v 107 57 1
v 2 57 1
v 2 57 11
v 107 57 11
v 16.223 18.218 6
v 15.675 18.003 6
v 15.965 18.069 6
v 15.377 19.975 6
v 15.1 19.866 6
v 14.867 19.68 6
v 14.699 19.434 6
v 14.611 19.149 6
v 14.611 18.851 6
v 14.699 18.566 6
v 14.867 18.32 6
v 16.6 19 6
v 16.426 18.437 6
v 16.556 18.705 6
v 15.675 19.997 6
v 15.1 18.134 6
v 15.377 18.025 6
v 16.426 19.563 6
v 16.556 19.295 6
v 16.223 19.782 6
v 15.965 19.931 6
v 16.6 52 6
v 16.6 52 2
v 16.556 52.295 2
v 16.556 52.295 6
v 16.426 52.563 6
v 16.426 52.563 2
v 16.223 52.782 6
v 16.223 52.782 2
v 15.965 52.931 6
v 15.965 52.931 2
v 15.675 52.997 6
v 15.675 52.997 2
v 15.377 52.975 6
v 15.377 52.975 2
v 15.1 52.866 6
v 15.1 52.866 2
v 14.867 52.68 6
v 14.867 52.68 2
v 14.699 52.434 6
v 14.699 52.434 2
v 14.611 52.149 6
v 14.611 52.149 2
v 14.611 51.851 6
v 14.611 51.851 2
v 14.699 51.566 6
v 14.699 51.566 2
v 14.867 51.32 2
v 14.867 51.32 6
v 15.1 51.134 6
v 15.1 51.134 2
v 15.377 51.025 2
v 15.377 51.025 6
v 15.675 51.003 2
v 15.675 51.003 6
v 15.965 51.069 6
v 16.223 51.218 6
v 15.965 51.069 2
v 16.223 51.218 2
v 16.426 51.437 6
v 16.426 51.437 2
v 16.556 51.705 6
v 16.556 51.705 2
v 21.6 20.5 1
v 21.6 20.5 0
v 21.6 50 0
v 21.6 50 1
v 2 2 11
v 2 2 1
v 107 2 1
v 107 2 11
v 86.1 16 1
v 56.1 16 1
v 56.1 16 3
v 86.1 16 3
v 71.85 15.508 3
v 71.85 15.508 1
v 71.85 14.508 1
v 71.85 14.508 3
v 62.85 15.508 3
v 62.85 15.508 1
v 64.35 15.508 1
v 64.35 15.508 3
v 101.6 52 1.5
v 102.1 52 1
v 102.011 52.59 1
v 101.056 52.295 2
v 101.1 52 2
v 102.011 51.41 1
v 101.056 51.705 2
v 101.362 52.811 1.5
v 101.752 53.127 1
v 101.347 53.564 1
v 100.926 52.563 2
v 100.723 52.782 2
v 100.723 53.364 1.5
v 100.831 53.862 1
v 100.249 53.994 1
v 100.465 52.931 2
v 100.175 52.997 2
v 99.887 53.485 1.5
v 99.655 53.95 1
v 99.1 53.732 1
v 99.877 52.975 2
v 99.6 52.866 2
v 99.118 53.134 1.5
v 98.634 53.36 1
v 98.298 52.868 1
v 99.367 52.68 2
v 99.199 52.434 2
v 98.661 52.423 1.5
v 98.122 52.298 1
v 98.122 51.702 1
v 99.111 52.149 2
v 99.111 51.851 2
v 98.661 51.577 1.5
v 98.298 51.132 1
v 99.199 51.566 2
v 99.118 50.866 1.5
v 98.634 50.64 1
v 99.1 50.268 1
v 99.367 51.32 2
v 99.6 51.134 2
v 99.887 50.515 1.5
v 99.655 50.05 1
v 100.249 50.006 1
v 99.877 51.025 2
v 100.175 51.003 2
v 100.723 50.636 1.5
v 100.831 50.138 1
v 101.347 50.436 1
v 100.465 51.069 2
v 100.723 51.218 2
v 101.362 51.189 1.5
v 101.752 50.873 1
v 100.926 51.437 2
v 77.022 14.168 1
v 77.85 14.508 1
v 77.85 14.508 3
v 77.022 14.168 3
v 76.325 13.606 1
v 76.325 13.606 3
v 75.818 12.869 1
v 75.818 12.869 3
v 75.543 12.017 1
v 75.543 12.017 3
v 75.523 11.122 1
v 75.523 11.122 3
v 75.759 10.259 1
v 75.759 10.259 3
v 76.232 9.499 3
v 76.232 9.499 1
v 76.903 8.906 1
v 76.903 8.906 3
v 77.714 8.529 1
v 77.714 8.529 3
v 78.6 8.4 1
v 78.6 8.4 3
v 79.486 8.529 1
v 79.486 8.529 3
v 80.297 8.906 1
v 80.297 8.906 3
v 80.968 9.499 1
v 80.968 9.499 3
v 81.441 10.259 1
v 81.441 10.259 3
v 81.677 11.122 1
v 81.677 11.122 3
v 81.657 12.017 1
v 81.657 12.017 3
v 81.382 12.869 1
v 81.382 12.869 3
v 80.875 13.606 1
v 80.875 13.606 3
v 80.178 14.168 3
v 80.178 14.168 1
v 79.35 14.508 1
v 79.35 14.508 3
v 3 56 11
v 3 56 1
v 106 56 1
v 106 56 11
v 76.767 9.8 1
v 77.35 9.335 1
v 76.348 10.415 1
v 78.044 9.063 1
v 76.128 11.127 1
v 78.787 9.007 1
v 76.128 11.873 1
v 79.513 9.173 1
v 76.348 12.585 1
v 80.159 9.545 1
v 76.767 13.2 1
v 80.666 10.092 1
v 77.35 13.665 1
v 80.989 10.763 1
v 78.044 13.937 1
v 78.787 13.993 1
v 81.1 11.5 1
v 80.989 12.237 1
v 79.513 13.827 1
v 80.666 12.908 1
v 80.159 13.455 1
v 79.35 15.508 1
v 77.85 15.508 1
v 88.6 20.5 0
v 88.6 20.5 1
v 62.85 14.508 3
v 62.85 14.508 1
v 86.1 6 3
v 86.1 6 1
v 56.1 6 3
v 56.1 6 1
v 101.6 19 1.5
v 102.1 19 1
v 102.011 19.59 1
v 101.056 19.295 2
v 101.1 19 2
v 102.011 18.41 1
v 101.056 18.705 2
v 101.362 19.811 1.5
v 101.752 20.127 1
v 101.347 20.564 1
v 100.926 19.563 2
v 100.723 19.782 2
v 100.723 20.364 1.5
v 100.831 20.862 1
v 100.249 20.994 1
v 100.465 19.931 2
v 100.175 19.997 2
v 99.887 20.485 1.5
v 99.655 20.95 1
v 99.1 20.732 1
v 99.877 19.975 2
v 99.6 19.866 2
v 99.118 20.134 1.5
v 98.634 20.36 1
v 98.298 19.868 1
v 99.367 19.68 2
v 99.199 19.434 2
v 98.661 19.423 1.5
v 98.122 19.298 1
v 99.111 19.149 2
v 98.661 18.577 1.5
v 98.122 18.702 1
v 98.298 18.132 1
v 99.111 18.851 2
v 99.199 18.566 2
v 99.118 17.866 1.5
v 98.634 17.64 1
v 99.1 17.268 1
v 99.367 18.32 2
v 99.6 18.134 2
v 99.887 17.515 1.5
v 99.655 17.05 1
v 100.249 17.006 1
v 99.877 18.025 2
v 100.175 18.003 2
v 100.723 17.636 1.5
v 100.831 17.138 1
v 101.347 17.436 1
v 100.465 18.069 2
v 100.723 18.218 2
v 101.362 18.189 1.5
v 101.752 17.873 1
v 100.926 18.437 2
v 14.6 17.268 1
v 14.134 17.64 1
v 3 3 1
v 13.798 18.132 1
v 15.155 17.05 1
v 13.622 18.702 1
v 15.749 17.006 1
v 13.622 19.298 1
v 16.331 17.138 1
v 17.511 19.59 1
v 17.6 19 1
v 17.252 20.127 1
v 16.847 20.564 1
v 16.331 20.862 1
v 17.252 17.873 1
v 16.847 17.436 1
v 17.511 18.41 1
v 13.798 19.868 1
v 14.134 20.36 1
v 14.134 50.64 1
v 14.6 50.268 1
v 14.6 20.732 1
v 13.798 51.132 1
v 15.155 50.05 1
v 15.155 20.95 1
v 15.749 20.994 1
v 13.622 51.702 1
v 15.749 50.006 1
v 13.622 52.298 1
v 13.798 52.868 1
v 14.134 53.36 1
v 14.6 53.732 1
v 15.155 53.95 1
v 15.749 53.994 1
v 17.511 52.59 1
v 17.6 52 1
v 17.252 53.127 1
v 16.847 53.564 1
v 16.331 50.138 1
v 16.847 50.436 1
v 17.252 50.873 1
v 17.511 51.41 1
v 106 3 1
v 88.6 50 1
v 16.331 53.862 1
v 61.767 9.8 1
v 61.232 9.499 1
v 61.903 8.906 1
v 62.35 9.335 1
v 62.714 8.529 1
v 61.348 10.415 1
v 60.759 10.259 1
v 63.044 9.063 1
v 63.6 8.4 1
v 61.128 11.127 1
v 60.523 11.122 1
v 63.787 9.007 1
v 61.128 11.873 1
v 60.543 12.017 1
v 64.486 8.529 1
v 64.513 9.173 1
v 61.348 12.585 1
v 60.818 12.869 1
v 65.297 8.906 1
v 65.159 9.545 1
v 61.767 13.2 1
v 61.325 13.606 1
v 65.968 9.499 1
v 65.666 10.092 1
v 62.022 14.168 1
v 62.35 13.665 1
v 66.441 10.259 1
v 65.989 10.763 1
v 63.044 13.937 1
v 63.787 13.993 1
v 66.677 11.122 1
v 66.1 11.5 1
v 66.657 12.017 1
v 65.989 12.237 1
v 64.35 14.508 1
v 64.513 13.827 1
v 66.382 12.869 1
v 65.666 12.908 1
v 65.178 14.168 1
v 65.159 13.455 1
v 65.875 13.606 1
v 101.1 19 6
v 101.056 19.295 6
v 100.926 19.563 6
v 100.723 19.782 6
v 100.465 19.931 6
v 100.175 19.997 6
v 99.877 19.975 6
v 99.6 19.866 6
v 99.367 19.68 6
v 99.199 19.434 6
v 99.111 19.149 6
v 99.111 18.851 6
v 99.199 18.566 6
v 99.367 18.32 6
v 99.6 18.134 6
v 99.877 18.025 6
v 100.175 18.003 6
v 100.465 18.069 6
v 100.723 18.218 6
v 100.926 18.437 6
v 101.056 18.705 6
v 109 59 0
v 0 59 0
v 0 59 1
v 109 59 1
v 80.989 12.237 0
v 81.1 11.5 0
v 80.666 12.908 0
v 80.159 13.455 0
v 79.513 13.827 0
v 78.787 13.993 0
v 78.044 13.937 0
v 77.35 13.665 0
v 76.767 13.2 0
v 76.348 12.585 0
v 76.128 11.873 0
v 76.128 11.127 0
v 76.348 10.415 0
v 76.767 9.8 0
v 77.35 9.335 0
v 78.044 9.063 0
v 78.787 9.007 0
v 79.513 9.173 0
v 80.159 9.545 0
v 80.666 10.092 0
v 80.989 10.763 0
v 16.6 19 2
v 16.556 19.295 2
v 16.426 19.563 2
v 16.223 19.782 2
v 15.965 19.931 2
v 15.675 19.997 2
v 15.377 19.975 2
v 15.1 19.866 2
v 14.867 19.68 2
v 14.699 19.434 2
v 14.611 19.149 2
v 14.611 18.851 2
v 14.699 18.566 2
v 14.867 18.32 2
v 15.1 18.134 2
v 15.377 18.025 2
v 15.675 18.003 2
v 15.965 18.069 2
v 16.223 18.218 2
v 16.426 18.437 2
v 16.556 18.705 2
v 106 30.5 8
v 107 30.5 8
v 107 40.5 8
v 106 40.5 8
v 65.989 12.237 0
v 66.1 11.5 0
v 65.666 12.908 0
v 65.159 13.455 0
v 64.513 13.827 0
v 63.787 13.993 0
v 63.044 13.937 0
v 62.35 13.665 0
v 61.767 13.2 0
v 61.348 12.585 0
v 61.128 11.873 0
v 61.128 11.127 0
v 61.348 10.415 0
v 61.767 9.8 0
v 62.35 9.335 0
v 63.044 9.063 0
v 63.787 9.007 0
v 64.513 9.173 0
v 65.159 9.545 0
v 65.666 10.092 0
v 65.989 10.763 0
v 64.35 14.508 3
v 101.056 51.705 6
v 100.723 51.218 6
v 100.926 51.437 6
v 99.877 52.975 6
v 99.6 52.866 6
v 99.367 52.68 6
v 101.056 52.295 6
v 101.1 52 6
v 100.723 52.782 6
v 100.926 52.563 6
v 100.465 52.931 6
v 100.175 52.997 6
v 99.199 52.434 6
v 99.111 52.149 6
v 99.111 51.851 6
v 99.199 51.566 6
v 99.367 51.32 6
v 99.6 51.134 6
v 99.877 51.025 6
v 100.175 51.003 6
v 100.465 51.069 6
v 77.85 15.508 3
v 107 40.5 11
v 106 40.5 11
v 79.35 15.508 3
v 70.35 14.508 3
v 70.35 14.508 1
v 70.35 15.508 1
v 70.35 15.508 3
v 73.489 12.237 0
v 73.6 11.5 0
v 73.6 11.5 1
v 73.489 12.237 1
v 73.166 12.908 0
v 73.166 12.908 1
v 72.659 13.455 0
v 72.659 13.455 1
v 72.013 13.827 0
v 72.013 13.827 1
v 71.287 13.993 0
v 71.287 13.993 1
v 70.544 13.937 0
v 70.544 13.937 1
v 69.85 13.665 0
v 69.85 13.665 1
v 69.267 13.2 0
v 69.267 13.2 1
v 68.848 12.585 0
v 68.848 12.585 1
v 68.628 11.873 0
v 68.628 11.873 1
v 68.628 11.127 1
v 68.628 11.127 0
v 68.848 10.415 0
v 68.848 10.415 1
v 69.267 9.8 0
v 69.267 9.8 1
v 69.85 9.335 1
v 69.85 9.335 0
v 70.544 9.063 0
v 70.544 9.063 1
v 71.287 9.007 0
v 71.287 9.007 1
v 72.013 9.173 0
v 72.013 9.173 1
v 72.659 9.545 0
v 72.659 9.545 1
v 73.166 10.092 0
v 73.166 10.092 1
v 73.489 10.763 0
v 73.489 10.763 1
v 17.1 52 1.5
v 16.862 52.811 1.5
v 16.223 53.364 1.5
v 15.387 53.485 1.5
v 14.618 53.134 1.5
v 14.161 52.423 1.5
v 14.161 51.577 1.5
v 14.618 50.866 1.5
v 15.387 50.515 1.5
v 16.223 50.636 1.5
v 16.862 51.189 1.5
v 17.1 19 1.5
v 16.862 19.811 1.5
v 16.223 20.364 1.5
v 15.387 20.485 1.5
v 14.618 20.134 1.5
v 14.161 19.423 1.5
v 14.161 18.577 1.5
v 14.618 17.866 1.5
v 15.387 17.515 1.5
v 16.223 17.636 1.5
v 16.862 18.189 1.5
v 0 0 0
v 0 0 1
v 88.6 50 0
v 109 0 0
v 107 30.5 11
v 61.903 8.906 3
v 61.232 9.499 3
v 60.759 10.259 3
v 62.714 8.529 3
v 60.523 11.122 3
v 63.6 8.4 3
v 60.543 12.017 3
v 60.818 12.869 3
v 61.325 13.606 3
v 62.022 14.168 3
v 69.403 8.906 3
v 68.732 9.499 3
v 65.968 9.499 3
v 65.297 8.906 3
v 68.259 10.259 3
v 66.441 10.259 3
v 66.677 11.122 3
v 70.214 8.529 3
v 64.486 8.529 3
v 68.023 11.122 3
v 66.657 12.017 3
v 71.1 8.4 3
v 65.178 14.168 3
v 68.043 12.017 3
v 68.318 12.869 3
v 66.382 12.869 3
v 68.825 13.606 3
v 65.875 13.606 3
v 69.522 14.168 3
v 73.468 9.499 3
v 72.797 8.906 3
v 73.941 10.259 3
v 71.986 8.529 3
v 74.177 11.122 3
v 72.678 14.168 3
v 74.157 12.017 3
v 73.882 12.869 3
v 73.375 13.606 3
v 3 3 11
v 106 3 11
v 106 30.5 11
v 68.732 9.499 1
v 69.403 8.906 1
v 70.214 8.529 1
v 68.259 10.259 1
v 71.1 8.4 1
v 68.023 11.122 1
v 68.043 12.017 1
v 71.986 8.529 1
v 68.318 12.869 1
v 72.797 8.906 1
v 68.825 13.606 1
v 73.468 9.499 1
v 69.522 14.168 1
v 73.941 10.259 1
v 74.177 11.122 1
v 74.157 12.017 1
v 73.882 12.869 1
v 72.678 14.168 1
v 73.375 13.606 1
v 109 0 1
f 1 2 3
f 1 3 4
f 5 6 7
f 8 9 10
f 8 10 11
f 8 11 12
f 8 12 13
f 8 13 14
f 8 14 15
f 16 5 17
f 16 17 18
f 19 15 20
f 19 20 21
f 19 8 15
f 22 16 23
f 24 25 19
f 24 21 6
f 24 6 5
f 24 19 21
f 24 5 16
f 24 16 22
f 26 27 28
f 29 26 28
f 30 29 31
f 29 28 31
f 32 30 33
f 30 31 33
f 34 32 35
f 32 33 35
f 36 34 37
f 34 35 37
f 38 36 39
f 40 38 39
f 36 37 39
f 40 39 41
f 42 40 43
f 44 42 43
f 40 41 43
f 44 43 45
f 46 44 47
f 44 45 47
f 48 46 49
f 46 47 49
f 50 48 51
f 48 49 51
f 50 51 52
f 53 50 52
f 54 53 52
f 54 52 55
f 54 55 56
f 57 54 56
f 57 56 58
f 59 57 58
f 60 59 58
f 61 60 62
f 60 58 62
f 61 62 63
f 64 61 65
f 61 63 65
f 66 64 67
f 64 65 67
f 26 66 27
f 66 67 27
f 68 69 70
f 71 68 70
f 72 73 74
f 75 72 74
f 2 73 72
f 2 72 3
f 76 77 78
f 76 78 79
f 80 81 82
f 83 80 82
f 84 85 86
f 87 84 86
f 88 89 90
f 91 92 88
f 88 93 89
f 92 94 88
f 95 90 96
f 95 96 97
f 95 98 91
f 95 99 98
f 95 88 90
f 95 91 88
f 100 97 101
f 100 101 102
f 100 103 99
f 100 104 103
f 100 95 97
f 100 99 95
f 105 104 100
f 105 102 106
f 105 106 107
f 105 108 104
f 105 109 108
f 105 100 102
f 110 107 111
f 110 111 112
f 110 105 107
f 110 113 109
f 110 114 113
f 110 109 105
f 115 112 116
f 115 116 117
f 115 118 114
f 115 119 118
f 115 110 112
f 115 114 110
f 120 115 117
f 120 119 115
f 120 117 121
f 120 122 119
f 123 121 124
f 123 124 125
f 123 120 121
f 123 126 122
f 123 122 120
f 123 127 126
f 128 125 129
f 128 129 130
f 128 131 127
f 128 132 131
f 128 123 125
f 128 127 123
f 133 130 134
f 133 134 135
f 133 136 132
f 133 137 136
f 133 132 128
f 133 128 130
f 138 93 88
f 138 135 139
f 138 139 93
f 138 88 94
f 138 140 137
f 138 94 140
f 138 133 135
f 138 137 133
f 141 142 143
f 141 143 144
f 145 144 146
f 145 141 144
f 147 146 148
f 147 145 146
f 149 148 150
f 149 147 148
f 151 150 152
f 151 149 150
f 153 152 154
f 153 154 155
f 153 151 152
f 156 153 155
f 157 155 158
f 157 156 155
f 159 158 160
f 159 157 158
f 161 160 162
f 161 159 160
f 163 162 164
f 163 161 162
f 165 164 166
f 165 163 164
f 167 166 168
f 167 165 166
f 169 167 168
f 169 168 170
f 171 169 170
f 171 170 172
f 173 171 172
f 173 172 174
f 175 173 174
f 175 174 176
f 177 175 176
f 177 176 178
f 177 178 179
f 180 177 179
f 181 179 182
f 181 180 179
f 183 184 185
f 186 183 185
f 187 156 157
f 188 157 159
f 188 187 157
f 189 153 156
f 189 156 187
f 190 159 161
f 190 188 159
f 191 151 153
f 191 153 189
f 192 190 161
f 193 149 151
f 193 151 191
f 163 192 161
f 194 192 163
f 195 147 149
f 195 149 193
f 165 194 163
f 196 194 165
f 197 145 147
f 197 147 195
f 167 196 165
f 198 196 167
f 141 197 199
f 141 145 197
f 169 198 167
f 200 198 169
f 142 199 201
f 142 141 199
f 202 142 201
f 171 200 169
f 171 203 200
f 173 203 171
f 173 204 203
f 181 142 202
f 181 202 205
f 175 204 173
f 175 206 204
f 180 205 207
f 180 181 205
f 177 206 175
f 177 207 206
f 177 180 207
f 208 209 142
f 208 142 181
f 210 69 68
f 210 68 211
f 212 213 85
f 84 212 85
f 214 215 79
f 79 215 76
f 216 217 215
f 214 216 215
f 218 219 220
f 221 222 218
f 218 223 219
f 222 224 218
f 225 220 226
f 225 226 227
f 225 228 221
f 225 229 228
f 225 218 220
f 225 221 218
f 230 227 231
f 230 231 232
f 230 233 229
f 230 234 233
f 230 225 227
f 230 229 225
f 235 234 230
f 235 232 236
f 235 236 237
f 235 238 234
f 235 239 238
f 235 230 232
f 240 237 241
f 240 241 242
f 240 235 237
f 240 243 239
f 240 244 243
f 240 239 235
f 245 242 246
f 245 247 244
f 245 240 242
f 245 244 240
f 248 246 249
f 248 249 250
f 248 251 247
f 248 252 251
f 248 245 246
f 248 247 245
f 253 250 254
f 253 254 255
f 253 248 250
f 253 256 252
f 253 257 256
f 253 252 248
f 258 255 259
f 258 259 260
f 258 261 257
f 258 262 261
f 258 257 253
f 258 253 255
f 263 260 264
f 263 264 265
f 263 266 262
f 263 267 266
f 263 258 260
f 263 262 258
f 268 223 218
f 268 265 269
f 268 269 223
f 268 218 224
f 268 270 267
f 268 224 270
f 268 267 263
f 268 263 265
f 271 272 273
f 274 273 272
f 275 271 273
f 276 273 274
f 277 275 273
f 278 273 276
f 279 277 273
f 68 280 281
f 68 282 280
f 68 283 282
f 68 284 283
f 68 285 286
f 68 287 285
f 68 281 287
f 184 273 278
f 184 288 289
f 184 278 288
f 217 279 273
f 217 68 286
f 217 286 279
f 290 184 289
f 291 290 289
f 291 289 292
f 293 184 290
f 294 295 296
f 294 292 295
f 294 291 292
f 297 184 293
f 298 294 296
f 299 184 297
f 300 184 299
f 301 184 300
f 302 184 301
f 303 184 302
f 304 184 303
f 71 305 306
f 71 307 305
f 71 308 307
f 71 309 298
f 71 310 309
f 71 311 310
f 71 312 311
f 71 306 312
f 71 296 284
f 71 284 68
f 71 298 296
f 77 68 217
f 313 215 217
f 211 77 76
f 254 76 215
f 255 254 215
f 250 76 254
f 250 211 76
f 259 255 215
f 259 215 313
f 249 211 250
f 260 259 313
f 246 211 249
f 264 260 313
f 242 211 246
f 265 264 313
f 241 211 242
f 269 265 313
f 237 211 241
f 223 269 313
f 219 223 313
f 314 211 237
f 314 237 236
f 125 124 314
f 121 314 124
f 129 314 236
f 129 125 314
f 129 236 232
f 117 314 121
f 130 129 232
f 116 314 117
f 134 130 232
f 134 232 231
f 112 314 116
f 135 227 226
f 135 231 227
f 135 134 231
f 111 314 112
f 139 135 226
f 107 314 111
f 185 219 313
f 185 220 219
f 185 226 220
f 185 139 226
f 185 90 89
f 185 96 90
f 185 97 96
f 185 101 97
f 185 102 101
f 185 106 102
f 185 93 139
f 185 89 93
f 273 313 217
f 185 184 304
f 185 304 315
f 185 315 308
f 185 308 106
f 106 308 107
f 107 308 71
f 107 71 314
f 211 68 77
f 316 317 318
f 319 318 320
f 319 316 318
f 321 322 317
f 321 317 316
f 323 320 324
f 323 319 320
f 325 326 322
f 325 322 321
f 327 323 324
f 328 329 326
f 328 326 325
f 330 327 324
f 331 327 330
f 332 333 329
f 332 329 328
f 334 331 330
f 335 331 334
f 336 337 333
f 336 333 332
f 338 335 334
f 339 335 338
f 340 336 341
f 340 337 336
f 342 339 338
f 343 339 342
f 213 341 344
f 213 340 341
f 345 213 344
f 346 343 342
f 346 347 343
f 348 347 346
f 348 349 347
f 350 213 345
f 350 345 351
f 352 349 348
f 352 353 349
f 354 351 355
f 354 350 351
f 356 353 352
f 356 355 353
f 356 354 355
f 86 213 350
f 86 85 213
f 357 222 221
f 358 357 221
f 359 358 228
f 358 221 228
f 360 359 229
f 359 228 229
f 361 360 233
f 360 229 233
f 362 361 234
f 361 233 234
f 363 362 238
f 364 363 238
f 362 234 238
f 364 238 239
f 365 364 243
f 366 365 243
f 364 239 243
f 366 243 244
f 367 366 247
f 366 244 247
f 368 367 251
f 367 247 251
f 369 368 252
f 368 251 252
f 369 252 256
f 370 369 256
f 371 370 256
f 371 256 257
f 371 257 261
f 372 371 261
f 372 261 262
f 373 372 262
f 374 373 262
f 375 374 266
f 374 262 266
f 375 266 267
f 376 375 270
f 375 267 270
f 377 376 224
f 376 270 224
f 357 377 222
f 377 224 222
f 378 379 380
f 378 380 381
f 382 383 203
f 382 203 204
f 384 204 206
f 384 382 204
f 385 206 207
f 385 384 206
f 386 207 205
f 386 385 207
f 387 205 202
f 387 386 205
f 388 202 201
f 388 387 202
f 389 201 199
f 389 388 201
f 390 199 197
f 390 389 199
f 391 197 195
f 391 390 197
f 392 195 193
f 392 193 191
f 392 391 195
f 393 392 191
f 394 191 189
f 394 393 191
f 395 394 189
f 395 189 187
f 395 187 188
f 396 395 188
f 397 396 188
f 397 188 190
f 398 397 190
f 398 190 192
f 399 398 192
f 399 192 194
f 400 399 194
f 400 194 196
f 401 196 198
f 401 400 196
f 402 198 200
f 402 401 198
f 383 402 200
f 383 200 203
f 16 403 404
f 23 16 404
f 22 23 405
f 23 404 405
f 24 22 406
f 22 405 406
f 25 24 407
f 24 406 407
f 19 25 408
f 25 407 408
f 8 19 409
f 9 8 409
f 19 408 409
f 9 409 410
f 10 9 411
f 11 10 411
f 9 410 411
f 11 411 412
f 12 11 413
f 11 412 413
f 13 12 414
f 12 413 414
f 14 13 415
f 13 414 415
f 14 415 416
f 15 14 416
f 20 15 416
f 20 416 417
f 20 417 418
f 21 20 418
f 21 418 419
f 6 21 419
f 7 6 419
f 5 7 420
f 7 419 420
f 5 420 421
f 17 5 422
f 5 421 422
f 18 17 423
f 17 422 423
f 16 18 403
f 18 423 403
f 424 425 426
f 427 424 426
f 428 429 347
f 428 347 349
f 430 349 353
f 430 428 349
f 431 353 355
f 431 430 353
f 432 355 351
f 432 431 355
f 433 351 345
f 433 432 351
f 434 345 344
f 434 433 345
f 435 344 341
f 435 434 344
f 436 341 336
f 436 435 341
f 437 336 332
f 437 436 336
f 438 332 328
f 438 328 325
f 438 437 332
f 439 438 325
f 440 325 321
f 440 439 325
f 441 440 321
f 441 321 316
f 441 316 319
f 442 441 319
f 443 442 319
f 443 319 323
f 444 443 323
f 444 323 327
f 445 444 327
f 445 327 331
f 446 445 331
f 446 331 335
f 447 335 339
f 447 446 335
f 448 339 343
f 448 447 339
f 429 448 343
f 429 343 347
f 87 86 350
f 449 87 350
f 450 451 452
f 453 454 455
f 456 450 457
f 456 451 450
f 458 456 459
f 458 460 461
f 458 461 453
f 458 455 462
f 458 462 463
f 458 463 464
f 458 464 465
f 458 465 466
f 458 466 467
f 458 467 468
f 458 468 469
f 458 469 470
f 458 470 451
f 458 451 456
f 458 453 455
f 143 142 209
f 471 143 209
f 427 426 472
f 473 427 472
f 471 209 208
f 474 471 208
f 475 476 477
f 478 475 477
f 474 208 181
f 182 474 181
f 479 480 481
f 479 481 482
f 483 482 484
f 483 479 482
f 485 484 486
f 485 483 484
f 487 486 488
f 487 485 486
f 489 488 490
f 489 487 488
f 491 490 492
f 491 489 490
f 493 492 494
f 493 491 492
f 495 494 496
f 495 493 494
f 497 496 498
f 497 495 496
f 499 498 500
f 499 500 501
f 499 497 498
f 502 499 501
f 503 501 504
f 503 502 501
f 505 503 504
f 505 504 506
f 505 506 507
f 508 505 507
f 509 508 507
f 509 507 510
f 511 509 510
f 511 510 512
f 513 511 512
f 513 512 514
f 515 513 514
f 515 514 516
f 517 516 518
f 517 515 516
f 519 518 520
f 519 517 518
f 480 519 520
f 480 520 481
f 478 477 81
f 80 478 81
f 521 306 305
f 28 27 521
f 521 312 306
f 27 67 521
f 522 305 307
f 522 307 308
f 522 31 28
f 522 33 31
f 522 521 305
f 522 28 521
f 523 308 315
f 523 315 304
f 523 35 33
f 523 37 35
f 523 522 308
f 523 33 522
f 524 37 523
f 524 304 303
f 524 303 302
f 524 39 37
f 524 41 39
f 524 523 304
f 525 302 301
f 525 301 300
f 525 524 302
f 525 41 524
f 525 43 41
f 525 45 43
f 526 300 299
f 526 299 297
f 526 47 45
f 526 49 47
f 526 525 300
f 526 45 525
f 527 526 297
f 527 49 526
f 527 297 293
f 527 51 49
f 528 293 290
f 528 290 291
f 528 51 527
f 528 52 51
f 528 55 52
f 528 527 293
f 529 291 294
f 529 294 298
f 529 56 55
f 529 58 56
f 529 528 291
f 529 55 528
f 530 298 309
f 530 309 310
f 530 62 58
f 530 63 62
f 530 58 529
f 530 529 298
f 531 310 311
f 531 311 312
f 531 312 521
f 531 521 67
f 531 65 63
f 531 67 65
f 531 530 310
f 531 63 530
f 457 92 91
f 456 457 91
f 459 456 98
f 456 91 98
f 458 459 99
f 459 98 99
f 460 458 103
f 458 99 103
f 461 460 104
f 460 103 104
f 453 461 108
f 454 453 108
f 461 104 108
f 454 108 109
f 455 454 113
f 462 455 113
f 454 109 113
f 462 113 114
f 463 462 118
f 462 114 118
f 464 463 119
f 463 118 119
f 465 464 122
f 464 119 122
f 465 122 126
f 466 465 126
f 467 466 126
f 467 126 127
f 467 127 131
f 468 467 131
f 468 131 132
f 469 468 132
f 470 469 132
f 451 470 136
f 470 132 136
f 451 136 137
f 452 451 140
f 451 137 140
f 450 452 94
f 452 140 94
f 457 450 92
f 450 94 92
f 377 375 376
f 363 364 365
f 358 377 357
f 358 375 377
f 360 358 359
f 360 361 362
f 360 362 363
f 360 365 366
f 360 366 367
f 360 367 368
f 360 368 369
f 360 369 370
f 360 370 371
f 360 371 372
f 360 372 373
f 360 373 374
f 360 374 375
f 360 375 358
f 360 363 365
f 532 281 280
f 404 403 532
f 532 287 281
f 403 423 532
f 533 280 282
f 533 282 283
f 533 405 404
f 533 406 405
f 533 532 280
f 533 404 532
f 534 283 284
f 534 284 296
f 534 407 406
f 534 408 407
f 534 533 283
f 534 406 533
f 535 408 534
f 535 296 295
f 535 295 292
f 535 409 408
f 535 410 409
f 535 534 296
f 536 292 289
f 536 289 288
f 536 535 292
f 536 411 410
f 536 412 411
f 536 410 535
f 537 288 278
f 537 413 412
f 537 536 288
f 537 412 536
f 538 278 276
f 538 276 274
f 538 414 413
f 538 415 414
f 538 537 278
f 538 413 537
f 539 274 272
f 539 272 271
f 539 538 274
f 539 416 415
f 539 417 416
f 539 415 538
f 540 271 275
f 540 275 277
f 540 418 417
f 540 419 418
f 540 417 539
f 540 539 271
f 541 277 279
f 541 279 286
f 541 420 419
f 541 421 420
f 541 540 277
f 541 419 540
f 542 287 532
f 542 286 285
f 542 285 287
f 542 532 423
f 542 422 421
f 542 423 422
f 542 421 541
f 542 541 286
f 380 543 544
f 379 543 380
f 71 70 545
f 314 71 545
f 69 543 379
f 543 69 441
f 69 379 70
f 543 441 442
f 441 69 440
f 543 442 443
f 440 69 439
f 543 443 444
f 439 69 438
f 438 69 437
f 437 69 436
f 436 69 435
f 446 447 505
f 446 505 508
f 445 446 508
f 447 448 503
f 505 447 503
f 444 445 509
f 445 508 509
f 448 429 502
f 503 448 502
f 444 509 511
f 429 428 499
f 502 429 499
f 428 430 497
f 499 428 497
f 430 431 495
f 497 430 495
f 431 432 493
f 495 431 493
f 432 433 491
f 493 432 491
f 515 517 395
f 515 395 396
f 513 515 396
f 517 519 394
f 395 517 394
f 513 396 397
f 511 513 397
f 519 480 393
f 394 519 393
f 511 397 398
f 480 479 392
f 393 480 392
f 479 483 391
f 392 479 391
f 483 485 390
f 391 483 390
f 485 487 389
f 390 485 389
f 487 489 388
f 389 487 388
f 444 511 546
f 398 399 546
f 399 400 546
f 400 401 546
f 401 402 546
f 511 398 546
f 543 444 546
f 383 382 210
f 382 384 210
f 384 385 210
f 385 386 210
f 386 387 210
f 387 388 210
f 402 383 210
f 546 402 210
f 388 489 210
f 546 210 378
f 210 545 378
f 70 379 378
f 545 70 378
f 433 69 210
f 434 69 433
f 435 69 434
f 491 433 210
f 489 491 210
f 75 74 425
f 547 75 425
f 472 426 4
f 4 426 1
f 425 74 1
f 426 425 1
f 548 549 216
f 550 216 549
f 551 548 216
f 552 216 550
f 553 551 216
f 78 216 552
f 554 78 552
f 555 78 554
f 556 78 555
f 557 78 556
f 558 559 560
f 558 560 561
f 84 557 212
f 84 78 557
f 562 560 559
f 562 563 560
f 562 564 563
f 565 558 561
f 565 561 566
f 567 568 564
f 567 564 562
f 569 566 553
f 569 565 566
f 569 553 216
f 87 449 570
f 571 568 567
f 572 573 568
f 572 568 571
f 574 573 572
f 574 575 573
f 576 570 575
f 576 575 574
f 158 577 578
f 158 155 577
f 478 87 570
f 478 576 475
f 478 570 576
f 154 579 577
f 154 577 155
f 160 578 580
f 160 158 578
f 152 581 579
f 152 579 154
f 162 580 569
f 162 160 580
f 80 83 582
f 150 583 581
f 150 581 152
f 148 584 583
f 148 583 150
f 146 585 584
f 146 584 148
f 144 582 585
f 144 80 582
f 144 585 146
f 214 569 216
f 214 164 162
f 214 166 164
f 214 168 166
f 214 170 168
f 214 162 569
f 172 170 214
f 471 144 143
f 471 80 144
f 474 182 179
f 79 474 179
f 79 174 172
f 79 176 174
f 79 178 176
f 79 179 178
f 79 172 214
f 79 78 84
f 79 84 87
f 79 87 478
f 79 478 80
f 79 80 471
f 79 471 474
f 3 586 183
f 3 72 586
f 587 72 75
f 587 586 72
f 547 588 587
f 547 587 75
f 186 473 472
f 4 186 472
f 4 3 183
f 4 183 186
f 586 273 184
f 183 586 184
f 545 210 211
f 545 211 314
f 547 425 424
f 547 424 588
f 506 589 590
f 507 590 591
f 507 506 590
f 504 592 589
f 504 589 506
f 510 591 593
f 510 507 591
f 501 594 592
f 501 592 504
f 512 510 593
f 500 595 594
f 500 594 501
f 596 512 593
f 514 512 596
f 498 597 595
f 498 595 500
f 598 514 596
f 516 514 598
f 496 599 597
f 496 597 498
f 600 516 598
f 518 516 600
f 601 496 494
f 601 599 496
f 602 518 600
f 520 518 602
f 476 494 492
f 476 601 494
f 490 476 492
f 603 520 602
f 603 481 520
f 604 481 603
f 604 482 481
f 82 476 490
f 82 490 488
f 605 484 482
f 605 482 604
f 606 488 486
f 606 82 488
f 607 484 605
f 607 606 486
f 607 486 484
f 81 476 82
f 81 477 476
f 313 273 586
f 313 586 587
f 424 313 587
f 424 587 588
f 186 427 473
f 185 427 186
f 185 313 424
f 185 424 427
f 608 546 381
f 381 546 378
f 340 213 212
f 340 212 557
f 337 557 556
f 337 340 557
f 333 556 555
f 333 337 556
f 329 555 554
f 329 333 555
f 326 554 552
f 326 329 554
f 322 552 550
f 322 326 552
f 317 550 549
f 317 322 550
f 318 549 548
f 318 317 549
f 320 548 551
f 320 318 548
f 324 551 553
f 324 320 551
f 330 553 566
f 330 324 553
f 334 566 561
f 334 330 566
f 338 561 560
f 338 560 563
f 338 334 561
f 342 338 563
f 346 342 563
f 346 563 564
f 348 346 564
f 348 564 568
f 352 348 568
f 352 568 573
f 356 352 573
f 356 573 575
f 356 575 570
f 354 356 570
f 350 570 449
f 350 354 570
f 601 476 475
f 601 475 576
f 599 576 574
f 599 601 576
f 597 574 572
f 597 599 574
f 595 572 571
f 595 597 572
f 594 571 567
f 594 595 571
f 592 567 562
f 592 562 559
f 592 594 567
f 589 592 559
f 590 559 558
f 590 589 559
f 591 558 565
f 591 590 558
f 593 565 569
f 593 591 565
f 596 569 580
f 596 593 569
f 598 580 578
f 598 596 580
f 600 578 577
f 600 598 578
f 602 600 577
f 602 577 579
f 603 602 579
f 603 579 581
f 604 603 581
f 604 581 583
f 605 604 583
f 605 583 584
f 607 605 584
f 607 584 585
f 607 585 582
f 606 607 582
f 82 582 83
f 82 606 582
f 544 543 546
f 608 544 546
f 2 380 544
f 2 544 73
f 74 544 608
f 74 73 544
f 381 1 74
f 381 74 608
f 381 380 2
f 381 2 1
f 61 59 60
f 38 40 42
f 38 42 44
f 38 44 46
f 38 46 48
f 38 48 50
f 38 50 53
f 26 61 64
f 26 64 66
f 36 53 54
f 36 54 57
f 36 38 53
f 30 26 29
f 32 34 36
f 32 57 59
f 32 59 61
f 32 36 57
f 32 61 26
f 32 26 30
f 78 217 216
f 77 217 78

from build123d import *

# Parameters (mm, degrees)
SKETCH015_W     = 109
SKETCH015_H     = 59
SKETCH015_R     = 2.5
SKETCH015_W_2   = 67
SKETCH015_H_2   = 29.5
PAD008_DEPTH    = 1
SKETCH016_R     = 1
PAD009_DEPTH    = 5
SKETCH017_W     = 105
SKETCH017_H     = 55
SKETCH017_W_2   = 103
SKETCH017_H_2   = 53
PAD010_DEPTH    = 10
SKETCH018_W     = 10
SKETCH018_H     = 3
POCKET002_DEPTH = 5
SKETCH019_W     = 30
SKETCH019_H     = 10
PAD011_DEPTH    = 2
CHAMFER008_SIZE = 1


with BuildPart() as part:
    # Sketch015 → Pad008 (new body)
    with BuildSketch(Plane.XY):
        with Locations((54.5, 29.5)):
            Rectangle(SKETCH015_W, SKETCH015_H)
        with Locations((63.6, 11.5)):
            Circle(SKETCH015_R, mode=Mode.SUBTRACT)
        with Locations((71.1, 11.5)):
            Circle(SKETCH015_R, mode=Mode.SUBTRACT)
        with Locations((78.6, 11.5)):
            Circle(SKETCH015_R, mode=Mode.SUBTRACT)
        with Locations((55.1, 35.25)):
            Rectangle(SKETCH015_W_2, SKETCH015_H_2, mode=Mode.SUBTRACT)
    extrude(amount=PAD008_DEPTH)

    # Sketch016 → Pad009 (join)
    with BuildSketch(Plane.XY.offset(1)):
        with Locations((15.6, 52)):
            Circle(SKETCH016_R)
        with Locations((100.1, 52)):
            Circle(SKETCH016_R)
        with Locations((100.1, 19)):
            Circle(SKETCH016_R)
        with Locations((15.6, 19)):
            Circle(SKETCH016_R)
    extrude(amount=PAD009_DEPTH)

    # Sketch017 → Pad010 (join)
    with BuildSketch(Plane.XY.offset(1)):
        with Locations((54.5, 29.5)):
            Rectangle(SKETCH017_W, SKETCH017_H)
        with Locations((54.5, 29.5)):
            Rectangle(SKETCH017_W_2, SKETCH017_H_2, mode=Mode.SUBTRACT)
    extrude(amount=PAD010_DEPTH)

    # Sketch018 (on Face16 of Pad010) → Pocket002 (cut)
    with BuildSketch(Plane.YZ.offset(107)):
        with Locations((35.5, 9.5)):
            Rectangle(SKETCH018_W, SKETCH018_H)
    extrude(amount=-POCKET002_DEPTH, mode=Mode.SUBTRACT)

    # Sketch019 (on Face18 of Pocket002) → Pad011 (join)
    with BuildSketch(Plane.XY.offset(1)):
        with Locations((71.1, 11)):
            Rectangle(SKETCH019_W, SKETCH019_H)
        with BuildLine():
            ThreePointArc((62.85, 14.507906), (63.6, 8.4), (64.35, 14.507906))
            Line((64.35, 15.507906), (64.35, 14.507906))
            Line((62.85, 15.507906), (64.35, 15.507906))
            Line((62.85, 14.507906), (62.85, 15.507906))
        make_face(mode=Mode.SUBTRACT)
        with BuildLine():
            ThreePointArc((70.35, 14.507906), (71.1, 8.4), (71.85, 14.507906))
            Line((71.85, 15.507906), (71.85, 14.507906))
            Line((70.35, 15.507906), (71.85, 15.507906))
            Line((70.35, 14.507906), (70.35, 15.507906))
        make_face(mode=Mode.SUBTRACT)
        with BuildLine():
            ThreePointArc((77.85, 14.507906), (78.6, 8.4), (79.35, 14.507906))
            Line((79.35, 15.507906), (79.35, 14.507906))
            Line((77.85, 15.507906), (79.35, 15.507906))
            Line((77.85, 14.507906), (77.85, 15.507906))
        make_face(mode=Mode.SUBTRACT)
    extrude(amount=PAD011_DEPTH)

    # Chamfer008
    chamfer008_edges = [part.edges().sort_by_distance(p)[0] for p in [
        (14.6, 52, 1),
        (14.6, 19, 1),
        (99.1, 19, 1),
        (99.1, 52, 1),
    ]]
    chamfer(chamfer008_edges, length=CHAMFER008_SIZE)


solid = part.part
